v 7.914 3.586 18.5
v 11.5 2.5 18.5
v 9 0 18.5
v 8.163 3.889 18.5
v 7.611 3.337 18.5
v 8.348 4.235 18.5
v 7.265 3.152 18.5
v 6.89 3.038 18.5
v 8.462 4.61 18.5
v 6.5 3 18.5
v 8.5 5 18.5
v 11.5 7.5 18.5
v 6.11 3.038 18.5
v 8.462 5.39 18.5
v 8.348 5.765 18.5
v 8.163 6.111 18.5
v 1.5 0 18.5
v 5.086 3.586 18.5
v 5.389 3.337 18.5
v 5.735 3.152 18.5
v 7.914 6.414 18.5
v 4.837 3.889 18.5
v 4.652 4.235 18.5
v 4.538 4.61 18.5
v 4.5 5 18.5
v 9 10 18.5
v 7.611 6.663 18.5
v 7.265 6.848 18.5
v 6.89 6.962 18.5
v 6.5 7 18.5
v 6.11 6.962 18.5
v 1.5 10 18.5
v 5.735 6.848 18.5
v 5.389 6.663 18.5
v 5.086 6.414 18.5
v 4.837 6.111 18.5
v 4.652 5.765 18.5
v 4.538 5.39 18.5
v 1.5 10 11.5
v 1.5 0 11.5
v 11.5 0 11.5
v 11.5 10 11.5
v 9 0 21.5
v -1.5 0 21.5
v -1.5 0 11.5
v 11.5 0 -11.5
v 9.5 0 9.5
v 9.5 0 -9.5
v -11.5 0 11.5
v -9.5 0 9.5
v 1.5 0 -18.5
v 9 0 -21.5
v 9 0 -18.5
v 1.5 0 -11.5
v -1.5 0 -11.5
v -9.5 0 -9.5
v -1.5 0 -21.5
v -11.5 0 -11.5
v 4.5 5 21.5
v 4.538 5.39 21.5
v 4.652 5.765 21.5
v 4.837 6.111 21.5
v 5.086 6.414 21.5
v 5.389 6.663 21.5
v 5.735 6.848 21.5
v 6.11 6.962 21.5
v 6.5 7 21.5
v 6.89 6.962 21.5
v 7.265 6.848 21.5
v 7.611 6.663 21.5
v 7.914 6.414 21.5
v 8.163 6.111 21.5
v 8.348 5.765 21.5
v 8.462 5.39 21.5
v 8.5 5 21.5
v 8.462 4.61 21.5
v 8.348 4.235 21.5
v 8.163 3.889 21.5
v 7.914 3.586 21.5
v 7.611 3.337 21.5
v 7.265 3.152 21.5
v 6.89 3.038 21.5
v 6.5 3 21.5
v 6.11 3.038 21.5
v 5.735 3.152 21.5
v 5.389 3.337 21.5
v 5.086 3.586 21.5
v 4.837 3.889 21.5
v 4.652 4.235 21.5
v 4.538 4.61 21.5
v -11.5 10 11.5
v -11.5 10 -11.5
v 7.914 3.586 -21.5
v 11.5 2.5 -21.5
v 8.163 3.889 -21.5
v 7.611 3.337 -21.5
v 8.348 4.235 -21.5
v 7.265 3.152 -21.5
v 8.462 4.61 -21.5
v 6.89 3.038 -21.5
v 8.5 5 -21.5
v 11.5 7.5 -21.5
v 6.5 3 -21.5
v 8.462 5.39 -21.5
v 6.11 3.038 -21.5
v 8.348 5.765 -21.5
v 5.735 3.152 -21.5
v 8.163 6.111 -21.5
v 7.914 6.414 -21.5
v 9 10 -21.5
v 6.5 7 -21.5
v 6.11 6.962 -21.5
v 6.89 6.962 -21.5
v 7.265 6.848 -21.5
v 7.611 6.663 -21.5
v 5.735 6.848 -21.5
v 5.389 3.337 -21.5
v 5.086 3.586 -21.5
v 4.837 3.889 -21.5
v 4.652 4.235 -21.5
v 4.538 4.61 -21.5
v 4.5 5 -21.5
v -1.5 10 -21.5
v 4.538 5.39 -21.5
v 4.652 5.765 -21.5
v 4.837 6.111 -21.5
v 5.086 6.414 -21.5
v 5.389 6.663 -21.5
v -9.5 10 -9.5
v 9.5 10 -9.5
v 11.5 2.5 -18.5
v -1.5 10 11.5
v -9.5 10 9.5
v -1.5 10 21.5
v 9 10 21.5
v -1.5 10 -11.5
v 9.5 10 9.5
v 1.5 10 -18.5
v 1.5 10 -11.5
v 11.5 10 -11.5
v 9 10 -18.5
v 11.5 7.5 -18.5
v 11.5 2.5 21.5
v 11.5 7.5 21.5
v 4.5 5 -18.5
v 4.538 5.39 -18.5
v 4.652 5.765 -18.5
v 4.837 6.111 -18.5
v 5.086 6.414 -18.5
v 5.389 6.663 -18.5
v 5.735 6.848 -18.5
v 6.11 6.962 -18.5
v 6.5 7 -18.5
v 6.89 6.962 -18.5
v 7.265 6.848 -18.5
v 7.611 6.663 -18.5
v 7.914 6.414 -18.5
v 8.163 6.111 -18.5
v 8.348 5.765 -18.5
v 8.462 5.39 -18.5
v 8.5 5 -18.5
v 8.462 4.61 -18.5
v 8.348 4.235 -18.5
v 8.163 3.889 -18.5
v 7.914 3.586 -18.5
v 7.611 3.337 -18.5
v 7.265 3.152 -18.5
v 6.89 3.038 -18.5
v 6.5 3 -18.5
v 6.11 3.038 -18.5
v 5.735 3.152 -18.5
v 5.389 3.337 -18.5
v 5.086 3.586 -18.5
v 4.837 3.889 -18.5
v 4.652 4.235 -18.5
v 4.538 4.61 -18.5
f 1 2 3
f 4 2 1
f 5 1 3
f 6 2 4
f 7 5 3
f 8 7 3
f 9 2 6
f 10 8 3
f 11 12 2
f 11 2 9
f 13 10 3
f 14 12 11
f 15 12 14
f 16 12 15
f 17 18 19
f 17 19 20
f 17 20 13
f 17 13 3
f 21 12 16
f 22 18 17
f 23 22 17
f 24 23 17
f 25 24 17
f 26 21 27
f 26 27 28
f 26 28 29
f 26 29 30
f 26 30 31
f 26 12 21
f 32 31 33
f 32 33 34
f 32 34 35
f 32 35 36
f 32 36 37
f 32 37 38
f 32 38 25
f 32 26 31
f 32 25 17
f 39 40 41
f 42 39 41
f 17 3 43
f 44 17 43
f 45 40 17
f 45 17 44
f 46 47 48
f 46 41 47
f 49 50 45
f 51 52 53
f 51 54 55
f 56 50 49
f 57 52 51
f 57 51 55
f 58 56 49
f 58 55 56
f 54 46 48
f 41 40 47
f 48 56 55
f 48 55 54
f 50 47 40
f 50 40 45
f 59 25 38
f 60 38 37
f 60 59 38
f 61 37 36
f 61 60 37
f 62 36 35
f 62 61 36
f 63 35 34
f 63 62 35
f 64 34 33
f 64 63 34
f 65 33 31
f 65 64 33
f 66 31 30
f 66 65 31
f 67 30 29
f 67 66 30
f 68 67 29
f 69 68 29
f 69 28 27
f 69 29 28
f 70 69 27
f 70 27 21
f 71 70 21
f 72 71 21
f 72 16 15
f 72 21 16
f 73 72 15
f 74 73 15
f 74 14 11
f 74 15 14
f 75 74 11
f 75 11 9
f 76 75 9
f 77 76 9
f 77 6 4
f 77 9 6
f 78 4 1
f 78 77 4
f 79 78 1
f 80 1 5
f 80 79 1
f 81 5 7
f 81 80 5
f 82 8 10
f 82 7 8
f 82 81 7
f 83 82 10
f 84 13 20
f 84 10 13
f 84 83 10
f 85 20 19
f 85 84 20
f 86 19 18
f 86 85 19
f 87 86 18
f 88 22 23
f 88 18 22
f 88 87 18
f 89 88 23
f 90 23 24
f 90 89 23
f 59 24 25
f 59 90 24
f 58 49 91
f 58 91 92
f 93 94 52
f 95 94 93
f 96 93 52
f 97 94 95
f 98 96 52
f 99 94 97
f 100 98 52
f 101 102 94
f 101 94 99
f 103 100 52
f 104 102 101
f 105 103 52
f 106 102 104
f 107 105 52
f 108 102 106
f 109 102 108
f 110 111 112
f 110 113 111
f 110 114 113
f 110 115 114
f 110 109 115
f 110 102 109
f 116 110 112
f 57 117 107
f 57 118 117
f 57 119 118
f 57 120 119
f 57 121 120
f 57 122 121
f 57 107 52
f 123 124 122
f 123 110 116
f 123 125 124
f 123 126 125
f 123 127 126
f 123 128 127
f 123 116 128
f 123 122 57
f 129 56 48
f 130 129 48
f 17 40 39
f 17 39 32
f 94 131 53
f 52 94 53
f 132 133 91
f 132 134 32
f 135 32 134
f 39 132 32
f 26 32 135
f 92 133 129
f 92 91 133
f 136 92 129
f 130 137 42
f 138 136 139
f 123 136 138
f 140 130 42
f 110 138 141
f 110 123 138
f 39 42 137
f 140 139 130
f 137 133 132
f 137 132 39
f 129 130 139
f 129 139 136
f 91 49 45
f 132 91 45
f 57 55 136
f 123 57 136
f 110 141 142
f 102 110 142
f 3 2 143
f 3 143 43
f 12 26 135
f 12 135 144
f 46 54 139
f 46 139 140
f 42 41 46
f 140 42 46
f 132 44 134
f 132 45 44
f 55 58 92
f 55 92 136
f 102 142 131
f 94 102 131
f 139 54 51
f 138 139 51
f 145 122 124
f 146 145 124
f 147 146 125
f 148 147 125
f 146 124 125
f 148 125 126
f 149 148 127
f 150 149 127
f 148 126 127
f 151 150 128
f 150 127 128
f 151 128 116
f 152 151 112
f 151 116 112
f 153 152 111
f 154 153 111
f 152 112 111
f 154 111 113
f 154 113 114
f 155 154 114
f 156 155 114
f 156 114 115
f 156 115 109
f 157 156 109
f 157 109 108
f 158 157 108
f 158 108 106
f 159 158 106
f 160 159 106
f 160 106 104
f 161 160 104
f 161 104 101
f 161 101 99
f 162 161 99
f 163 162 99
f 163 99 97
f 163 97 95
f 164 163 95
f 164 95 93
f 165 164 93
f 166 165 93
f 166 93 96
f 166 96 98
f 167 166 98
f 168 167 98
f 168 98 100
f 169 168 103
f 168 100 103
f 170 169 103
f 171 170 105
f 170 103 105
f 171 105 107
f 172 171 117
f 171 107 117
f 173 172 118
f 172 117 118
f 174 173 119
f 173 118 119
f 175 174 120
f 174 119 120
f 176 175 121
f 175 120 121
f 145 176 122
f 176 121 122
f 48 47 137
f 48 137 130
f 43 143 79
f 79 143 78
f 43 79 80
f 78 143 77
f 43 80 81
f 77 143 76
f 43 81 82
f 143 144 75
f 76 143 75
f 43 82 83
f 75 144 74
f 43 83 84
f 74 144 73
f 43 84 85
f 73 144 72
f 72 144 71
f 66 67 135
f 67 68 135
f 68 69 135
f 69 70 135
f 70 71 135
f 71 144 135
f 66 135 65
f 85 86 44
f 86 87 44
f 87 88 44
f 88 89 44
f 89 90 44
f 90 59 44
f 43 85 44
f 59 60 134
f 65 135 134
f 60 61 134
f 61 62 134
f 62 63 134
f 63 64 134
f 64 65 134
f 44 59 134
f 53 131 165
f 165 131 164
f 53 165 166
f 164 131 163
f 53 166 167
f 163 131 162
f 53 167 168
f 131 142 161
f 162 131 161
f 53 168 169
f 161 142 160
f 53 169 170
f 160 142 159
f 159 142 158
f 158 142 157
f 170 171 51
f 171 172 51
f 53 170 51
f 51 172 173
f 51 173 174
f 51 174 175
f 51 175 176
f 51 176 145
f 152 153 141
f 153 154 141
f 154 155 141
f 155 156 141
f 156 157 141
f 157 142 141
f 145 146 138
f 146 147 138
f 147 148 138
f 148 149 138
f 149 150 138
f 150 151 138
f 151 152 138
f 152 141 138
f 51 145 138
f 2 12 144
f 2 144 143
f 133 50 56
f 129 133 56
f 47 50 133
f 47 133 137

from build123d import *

# Parameters (mm, degrees)
CROQUIS1_W              = 23
CROQUIS1_H              = 23
CROQUIS1_W_2            = 19
CROQUIS1_H_2            = 19
SALIENTE_EXTRUIR1_DEPTH = 10
CROQUIS2_W              = 7
CROQUIS2_H              = 10
SALIENTE_EXTRUIR2_DEPTH = 1.5
SALIENTE_EXTRUIR3_DEPTH = 3
CROQUIS4_R              = 2
CORTAR_EXTRUIR1_DEPTH   = 4


with BuildPart() as part:
    # Croquis1 → Saliente-Extruir1 (new body)
    with BuildSketch(Plane(origin=(0, 0, 0), x_dir=(1, 0, 0), z_dir=(0, 1, 0))):
        Rectangle(CROQUIS1_W, CROQUIS1_H)
        Rectangle(CROQUIS1_W_2, CROQUIS1_H_2, mode=Mode.SUBTRACT)
    extrude(amount=SALIENTE_EXTRUIR1_DEPTH)

    # Croquis2 → Saliente-Extruir2 (add, symmetric)
    with BuildSketch(Plane(origin=(0, 0, 0), x_dir=(0, 0, -1), z_dir=(1, 0, 0))):
        with Locations((15, 5)):
            Rectangle(CROQUIS2_W, CROQUIS2_H)
    saliente_extruir2 = extrude(amount=SALIENTE_EXTRUIR2_DEPTH, both=True)

    # Croquis3 → Saliente-Extruir3 (add)
    with BuildSketch(Plane(origin=(0, 0, -18.5), x_dir=(-1, 0, 0), z_dir=(0, 0, -1))):
        Polygon((-9, 10), (-11.5, 7.5), (-11.5, 2.5), (-9, 0), (1.5, 0), (1.5, 10), align=None)
    saliente_extruir3 = extrude(amount=SALIENTE_EXTRUIR3_DEPTH)

    # Croquis4 → Cortar-Extruir1 (cut)
    with BuildSketch(Plane(origin=(0, 0, -21.5), x_dir=(-1, 0, 0), z_dir=(0, 0, -1))):
        with Locations((-6.5, 5)):
            Circle(CROQUIS4_R)
    cortar_extruir1 = extrude(amount=-CORTAR_EXTRUIR1_DEPTH, mode=Mode.SUBTRACT)

    # Simetría1: Saliente-Extruir2, Saliente-Extruir3, Cortar-Extruir1 across plane
    add(saliente_extruir2.mirror(Plane.XY))
    add(saliente_extruir3.mirror(Plane.XY))
    add(cortar_extruir1.mirror(Plane.XY), mode=Mode.SUBTRACT)


solid = part.part
